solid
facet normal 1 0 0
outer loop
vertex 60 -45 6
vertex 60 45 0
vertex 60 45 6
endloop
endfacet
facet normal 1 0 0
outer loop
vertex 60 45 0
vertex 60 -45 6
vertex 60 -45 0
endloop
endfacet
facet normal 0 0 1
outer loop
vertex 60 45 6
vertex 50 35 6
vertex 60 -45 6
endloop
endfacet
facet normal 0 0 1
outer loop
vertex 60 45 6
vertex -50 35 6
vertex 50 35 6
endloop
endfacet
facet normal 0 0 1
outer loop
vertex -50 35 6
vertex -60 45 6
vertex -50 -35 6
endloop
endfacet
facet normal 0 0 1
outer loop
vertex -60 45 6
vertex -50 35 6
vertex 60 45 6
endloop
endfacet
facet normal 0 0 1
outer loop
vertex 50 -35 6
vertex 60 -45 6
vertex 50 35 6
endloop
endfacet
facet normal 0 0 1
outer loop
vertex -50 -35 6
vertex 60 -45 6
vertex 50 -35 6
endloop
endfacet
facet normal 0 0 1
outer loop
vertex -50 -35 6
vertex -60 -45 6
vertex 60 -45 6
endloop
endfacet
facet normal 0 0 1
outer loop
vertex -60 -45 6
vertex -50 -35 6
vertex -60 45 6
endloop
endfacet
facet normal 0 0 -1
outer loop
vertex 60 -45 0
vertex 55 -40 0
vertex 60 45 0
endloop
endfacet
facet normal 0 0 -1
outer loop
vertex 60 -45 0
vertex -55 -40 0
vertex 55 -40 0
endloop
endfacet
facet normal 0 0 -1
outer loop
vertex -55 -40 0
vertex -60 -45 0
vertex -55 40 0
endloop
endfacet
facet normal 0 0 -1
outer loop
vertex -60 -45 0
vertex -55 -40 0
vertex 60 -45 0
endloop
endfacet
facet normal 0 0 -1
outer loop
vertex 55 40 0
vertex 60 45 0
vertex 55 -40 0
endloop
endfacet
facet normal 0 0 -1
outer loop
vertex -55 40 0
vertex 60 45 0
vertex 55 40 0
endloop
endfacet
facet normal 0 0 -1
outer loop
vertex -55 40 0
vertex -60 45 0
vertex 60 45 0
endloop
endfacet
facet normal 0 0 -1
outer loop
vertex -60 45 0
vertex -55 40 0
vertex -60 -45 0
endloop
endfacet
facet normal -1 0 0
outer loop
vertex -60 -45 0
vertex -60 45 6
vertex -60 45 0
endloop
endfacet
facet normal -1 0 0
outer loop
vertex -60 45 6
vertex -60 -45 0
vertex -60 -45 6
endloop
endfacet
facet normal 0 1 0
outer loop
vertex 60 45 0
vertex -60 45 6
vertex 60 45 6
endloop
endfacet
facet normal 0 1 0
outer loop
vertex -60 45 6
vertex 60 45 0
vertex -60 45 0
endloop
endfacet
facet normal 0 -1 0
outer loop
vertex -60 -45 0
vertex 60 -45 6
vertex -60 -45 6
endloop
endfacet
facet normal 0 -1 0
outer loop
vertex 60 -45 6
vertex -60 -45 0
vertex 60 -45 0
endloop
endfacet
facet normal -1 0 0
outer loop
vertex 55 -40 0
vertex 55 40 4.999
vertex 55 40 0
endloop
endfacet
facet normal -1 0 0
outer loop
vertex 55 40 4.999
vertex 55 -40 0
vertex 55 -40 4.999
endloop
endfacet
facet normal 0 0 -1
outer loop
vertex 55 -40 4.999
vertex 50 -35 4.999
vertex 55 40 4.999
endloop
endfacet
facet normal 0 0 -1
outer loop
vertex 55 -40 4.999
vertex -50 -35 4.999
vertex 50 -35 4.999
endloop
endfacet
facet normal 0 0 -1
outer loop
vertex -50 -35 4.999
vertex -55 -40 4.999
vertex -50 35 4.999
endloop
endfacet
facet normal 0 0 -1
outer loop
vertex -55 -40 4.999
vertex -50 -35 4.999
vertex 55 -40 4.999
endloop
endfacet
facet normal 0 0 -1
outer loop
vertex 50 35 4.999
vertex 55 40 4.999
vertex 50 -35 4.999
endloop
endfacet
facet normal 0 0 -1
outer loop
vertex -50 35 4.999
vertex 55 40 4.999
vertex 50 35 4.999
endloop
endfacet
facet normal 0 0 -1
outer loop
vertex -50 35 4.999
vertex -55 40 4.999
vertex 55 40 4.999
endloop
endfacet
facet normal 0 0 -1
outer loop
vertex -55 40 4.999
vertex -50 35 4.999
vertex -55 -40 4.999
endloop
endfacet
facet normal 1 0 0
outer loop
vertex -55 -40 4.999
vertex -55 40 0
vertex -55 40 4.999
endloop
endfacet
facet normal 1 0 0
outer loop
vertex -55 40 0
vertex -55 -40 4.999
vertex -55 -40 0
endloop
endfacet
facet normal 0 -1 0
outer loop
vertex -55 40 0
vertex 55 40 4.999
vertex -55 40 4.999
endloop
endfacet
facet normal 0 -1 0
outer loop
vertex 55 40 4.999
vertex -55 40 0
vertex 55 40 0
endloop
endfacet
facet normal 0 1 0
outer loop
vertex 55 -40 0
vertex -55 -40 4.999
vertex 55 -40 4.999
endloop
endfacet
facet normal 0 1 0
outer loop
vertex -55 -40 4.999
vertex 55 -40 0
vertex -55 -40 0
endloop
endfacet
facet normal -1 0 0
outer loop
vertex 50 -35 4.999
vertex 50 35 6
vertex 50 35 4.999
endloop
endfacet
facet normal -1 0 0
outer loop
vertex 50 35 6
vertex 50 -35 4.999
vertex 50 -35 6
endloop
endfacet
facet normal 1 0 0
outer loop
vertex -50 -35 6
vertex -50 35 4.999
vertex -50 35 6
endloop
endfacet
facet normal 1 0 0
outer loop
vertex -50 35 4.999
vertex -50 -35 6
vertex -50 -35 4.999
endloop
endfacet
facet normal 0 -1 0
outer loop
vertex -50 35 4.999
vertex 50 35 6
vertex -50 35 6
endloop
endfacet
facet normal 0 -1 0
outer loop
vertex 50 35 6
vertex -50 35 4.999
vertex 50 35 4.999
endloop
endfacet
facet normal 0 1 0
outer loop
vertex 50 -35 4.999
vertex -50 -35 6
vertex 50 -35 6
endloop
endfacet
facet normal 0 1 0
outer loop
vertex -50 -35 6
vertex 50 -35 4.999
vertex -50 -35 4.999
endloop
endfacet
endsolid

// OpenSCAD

part = "sleeve"; // [holder:Holder,sleeve:Sleeve]

width = 100; //[10:0.1:250]
length = 70; //[10:0.1:250]
height = 1.5; //[0.1:0.1:5]
inset = 0.5; //[0.1:0.1:5]
border = 5; //[1:0.5:10]
base = 5; //[1:0.1:10]
sleeve = 5; //[1:0.1:10]

if (part == "holder") {
 translate([0, 0, (base) / 2])
  difference(){
   cube([width + (border * 2), length + (border * 2), base],  true);
   translate([0, 0, (base - inset + 0.001) / 2])
    cube([width, length, inset + 0.001], true);
  }
} else if (part == "sleeve") {
 //rotate([0, 180, 0])
 difference(){
  translate([0,0,(base + (height - inset)) / 2])
   cube(
    [width + (border * 2) + (sleeve * 2),
     length + (border * 2) + (sleeve * 2),
     base + height - inset], true);
   translate([0, 0, (base - 0.001) / 2])
    cube([width + (border * 2), length + (border * 2), base],  true);
   translate([0, 0, (base + height + inset + 0.001) / 2])  
    cube([width, length,  base + height + inset + 0.001], true);
 }
}
